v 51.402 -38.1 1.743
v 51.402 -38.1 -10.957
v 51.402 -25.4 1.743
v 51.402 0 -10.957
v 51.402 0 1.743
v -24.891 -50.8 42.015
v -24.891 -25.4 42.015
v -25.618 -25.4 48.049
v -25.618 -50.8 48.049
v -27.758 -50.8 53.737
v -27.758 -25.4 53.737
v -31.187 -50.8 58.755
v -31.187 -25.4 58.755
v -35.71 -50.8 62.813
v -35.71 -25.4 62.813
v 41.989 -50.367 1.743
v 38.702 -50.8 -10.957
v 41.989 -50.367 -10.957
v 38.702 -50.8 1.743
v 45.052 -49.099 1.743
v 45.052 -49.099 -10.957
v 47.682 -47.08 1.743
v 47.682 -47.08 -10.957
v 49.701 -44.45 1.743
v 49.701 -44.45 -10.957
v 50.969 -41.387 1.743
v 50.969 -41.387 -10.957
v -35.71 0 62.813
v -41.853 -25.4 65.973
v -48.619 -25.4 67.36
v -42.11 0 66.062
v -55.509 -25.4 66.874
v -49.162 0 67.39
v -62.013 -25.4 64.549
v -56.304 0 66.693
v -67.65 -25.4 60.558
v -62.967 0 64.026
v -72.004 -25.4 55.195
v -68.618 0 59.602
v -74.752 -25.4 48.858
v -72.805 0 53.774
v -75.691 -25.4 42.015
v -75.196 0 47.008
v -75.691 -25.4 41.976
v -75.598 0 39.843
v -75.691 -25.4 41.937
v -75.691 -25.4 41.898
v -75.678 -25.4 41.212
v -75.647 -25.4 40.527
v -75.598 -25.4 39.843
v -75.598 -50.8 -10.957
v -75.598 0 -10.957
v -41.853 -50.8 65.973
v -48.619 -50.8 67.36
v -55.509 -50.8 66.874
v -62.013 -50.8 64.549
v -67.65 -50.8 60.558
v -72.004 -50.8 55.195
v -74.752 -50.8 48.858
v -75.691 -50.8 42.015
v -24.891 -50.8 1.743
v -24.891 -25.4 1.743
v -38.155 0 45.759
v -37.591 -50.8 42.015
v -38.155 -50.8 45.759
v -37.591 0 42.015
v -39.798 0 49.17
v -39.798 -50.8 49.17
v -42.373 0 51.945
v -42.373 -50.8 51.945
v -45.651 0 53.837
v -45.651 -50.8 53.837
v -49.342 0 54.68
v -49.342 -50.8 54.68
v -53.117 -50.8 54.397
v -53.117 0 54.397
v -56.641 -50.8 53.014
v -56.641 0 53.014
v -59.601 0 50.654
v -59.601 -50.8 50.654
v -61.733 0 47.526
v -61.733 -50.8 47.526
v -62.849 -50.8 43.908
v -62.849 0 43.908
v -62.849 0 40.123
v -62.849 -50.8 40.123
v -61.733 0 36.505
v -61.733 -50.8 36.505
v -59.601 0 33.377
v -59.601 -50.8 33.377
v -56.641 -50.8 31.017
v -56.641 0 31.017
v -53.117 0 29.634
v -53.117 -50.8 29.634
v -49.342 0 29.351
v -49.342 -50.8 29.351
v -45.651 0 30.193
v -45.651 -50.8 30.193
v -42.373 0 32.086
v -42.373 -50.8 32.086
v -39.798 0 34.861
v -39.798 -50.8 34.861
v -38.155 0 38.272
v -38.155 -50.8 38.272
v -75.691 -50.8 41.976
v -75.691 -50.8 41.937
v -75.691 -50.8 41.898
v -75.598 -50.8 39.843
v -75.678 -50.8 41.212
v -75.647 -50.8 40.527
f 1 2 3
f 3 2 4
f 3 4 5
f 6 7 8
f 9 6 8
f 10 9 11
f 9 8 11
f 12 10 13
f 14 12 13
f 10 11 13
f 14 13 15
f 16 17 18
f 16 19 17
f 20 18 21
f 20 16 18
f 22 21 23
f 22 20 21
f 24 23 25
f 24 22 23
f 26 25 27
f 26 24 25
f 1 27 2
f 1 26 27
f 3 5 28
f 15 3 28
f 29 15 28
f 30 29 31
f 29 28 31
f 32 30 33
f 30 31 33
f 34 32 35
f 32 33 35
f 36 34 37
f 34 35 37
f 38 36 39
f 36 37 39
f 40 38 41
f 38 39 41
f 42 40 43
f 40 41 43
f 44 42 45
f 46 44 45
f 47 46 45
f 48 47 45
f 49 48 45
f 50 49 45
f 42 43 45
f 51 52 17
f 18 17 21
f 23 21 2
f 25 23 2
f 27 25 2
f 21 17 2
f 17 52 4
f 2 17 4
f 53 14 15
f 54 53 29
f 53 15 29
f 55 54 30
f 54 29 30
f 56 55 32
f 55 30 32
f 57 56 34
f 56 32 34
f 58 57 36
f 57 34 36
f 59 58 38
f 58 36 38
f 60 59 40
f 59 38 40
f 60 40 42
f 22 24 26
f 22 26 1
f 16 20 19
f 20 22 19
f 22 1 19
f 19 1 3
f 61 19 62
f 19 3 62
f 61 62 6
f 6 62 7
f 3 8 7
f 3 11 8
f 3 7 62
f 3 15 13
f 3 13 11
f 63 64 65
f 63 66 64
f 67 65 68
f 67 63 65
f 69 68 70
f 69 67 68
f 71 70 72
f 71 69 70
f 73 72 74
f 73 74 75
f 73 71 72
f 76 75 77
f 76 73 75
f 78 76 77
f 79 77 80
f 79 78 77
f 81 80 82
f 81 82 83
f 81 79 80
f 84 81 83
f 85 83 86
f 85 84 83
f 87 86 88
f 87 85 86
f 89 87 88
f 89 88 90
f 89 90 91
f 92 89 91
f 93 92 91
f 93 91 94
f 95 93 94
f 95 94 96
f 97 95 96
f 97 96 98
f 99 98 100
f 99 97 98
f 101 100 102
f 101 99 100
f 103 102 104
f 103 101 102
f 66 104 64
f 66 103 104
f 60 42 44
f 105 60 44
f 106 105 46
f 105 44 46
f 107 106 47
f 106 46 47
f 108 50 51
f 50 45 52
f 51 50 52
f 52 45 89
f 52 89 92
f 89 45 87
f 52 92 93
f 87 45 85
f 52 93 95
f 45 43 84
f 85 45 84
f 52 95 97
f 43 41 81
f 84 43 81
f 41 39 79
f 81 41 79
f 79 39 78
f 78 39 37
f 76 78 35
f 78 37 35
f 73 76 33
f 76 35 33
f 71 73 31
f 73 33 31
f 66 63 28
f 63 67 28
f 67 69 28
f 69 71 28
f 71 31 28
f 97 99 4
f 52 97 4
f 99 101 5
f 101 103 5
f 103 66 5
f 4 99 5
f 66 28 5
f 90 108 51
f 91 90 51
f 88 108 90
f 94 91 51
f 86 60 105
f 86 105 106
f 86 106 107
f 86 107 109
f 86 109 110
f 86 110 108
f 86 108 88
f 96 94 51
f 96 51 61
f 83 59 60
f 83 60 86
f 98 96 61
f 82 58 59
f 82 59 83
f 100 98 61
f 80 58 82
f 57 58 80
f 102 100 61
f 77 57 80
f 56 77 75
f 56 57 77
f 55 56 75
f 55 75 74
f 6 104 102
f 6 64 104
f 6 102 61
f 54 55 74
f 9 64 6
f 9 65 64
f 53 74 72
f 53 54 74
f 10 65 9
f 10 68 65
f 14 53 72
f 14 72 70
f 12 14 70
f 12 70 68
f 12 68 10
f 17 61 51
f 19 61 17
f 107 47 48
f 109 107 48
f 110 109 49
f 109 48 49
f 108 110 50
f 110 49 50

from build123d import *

# Parameters (mm, degrees)
F0_R     = 12.7
F1_DEPTH = 25.4
F2_R     = 12.7
F3_DEPTH = 25.4
F4_R     = 12.7


with BuildPart() as f1:
    # F0 (on Front) → F1 (new body)
    with BuildSketch(Plane.XZ):
        with BuildLine():
            ThreePointArc((-75.5979648529, 39.8426862847), (-49.2037324517, 16.6386265616), (-24.8910574185, 42.0153427482))
            ThreePointArc((-24.8910574185, 42.0153427482), (-27.7576393347, 53.737333597), (-35.7103542263, 62.8134939742))
            ThreePointArc((-35.7103542263, 62.8134939742), (-62.9669150163, 64.0263089733), (-75.5979648529, 39.8426862847))
        make_face()
        with Locations((-50.2910574185, 42.0153427482)):
            Circle(F0_R, mode=Mode.SUBTRACT)
        with BuildLine():
            ThreePointArc((-35.7103542263, 62.8134939742), (-27.7576393347, 53.737333597), (-24.8910574185, 42.0153427482))
            ThreePointArc((-24.8910574185, 42.0153427482), (-49.2037324517, 16.6386265616), (-75.5979648529, 39.8426862847))
            Line((-75.5979648529, 39.8426862847), (-75.5979648529, -10.9573137153))
            Line((-75.5979648529, -10.9573137153), (51.4020351471, -10.9573137153))
            Line((51.4020351471, -10.9573137153), (51.4020351471, 1.7426862847))
            Line((51.4020351471, 1.7426862847), (-35.7103542263, 62.8134939742))
        make_face()
    extrude(amount=F1_DEPTH)

    # F2 (on face) → F3 (join)
    with BuildSketch(Plane.XZ.offset(25.4)):
        with BuildLine():
            Line((-24.8910574185, 1.7426862847), (-24.8910574185, 42.0153427482))
            ThreePointArc((-24.8910574185, 42.0153427482), (-27.7576393347, 53.737333597), (-35.7103542263, 62.8134939742))
            ThreePointArc((-35.7103542263, 62.8134939742), (-62.0130482673, 64.548760832), (-75.6910574185, 42.0153427482))
            ThreePointArc((-75.6910574185, 42.0153427482), (-75.6909895589, 41.9566293417), (-75.6907859804, 41.8979162489))
            ThreePointArc((-75.6907859804, 41.8979162489), (-75.6651924002, 40.8693611015), (-75.5979648529, 39.8426862847))
            Line((-75.5979648529, 39.8426862847), (-75.5979648529, 1.7426862847))
            Line((-75.5979648529, 1.7426862847), (-75.5979648529, -10.9573137153))
            Line((-75.5979648529, -10.9573137153), (51.4020351471, -10.9573137153))
            Line((51.4020351471, -10.9573137153), (51.4020351471, 1.7426862847))
            Line((51.4020351471, 1.7426862847), (-24.8910574185, 1.7426862847))
        make_face()
        with Locations((-50.2910574185, 42.0153427482)):
            Circle(F2_R, mode=Mode.SUBTRACT)
    extrude(amount=F3_DEPTH)

    # F4
    f4_edges = [f1.edges().sort_by_distance(p)[0] for p in [
        (51.402035, -50.8, -4.607314),
    ]]
    fillet(f4_edges, radius=F4_R)


solid = f1.part
